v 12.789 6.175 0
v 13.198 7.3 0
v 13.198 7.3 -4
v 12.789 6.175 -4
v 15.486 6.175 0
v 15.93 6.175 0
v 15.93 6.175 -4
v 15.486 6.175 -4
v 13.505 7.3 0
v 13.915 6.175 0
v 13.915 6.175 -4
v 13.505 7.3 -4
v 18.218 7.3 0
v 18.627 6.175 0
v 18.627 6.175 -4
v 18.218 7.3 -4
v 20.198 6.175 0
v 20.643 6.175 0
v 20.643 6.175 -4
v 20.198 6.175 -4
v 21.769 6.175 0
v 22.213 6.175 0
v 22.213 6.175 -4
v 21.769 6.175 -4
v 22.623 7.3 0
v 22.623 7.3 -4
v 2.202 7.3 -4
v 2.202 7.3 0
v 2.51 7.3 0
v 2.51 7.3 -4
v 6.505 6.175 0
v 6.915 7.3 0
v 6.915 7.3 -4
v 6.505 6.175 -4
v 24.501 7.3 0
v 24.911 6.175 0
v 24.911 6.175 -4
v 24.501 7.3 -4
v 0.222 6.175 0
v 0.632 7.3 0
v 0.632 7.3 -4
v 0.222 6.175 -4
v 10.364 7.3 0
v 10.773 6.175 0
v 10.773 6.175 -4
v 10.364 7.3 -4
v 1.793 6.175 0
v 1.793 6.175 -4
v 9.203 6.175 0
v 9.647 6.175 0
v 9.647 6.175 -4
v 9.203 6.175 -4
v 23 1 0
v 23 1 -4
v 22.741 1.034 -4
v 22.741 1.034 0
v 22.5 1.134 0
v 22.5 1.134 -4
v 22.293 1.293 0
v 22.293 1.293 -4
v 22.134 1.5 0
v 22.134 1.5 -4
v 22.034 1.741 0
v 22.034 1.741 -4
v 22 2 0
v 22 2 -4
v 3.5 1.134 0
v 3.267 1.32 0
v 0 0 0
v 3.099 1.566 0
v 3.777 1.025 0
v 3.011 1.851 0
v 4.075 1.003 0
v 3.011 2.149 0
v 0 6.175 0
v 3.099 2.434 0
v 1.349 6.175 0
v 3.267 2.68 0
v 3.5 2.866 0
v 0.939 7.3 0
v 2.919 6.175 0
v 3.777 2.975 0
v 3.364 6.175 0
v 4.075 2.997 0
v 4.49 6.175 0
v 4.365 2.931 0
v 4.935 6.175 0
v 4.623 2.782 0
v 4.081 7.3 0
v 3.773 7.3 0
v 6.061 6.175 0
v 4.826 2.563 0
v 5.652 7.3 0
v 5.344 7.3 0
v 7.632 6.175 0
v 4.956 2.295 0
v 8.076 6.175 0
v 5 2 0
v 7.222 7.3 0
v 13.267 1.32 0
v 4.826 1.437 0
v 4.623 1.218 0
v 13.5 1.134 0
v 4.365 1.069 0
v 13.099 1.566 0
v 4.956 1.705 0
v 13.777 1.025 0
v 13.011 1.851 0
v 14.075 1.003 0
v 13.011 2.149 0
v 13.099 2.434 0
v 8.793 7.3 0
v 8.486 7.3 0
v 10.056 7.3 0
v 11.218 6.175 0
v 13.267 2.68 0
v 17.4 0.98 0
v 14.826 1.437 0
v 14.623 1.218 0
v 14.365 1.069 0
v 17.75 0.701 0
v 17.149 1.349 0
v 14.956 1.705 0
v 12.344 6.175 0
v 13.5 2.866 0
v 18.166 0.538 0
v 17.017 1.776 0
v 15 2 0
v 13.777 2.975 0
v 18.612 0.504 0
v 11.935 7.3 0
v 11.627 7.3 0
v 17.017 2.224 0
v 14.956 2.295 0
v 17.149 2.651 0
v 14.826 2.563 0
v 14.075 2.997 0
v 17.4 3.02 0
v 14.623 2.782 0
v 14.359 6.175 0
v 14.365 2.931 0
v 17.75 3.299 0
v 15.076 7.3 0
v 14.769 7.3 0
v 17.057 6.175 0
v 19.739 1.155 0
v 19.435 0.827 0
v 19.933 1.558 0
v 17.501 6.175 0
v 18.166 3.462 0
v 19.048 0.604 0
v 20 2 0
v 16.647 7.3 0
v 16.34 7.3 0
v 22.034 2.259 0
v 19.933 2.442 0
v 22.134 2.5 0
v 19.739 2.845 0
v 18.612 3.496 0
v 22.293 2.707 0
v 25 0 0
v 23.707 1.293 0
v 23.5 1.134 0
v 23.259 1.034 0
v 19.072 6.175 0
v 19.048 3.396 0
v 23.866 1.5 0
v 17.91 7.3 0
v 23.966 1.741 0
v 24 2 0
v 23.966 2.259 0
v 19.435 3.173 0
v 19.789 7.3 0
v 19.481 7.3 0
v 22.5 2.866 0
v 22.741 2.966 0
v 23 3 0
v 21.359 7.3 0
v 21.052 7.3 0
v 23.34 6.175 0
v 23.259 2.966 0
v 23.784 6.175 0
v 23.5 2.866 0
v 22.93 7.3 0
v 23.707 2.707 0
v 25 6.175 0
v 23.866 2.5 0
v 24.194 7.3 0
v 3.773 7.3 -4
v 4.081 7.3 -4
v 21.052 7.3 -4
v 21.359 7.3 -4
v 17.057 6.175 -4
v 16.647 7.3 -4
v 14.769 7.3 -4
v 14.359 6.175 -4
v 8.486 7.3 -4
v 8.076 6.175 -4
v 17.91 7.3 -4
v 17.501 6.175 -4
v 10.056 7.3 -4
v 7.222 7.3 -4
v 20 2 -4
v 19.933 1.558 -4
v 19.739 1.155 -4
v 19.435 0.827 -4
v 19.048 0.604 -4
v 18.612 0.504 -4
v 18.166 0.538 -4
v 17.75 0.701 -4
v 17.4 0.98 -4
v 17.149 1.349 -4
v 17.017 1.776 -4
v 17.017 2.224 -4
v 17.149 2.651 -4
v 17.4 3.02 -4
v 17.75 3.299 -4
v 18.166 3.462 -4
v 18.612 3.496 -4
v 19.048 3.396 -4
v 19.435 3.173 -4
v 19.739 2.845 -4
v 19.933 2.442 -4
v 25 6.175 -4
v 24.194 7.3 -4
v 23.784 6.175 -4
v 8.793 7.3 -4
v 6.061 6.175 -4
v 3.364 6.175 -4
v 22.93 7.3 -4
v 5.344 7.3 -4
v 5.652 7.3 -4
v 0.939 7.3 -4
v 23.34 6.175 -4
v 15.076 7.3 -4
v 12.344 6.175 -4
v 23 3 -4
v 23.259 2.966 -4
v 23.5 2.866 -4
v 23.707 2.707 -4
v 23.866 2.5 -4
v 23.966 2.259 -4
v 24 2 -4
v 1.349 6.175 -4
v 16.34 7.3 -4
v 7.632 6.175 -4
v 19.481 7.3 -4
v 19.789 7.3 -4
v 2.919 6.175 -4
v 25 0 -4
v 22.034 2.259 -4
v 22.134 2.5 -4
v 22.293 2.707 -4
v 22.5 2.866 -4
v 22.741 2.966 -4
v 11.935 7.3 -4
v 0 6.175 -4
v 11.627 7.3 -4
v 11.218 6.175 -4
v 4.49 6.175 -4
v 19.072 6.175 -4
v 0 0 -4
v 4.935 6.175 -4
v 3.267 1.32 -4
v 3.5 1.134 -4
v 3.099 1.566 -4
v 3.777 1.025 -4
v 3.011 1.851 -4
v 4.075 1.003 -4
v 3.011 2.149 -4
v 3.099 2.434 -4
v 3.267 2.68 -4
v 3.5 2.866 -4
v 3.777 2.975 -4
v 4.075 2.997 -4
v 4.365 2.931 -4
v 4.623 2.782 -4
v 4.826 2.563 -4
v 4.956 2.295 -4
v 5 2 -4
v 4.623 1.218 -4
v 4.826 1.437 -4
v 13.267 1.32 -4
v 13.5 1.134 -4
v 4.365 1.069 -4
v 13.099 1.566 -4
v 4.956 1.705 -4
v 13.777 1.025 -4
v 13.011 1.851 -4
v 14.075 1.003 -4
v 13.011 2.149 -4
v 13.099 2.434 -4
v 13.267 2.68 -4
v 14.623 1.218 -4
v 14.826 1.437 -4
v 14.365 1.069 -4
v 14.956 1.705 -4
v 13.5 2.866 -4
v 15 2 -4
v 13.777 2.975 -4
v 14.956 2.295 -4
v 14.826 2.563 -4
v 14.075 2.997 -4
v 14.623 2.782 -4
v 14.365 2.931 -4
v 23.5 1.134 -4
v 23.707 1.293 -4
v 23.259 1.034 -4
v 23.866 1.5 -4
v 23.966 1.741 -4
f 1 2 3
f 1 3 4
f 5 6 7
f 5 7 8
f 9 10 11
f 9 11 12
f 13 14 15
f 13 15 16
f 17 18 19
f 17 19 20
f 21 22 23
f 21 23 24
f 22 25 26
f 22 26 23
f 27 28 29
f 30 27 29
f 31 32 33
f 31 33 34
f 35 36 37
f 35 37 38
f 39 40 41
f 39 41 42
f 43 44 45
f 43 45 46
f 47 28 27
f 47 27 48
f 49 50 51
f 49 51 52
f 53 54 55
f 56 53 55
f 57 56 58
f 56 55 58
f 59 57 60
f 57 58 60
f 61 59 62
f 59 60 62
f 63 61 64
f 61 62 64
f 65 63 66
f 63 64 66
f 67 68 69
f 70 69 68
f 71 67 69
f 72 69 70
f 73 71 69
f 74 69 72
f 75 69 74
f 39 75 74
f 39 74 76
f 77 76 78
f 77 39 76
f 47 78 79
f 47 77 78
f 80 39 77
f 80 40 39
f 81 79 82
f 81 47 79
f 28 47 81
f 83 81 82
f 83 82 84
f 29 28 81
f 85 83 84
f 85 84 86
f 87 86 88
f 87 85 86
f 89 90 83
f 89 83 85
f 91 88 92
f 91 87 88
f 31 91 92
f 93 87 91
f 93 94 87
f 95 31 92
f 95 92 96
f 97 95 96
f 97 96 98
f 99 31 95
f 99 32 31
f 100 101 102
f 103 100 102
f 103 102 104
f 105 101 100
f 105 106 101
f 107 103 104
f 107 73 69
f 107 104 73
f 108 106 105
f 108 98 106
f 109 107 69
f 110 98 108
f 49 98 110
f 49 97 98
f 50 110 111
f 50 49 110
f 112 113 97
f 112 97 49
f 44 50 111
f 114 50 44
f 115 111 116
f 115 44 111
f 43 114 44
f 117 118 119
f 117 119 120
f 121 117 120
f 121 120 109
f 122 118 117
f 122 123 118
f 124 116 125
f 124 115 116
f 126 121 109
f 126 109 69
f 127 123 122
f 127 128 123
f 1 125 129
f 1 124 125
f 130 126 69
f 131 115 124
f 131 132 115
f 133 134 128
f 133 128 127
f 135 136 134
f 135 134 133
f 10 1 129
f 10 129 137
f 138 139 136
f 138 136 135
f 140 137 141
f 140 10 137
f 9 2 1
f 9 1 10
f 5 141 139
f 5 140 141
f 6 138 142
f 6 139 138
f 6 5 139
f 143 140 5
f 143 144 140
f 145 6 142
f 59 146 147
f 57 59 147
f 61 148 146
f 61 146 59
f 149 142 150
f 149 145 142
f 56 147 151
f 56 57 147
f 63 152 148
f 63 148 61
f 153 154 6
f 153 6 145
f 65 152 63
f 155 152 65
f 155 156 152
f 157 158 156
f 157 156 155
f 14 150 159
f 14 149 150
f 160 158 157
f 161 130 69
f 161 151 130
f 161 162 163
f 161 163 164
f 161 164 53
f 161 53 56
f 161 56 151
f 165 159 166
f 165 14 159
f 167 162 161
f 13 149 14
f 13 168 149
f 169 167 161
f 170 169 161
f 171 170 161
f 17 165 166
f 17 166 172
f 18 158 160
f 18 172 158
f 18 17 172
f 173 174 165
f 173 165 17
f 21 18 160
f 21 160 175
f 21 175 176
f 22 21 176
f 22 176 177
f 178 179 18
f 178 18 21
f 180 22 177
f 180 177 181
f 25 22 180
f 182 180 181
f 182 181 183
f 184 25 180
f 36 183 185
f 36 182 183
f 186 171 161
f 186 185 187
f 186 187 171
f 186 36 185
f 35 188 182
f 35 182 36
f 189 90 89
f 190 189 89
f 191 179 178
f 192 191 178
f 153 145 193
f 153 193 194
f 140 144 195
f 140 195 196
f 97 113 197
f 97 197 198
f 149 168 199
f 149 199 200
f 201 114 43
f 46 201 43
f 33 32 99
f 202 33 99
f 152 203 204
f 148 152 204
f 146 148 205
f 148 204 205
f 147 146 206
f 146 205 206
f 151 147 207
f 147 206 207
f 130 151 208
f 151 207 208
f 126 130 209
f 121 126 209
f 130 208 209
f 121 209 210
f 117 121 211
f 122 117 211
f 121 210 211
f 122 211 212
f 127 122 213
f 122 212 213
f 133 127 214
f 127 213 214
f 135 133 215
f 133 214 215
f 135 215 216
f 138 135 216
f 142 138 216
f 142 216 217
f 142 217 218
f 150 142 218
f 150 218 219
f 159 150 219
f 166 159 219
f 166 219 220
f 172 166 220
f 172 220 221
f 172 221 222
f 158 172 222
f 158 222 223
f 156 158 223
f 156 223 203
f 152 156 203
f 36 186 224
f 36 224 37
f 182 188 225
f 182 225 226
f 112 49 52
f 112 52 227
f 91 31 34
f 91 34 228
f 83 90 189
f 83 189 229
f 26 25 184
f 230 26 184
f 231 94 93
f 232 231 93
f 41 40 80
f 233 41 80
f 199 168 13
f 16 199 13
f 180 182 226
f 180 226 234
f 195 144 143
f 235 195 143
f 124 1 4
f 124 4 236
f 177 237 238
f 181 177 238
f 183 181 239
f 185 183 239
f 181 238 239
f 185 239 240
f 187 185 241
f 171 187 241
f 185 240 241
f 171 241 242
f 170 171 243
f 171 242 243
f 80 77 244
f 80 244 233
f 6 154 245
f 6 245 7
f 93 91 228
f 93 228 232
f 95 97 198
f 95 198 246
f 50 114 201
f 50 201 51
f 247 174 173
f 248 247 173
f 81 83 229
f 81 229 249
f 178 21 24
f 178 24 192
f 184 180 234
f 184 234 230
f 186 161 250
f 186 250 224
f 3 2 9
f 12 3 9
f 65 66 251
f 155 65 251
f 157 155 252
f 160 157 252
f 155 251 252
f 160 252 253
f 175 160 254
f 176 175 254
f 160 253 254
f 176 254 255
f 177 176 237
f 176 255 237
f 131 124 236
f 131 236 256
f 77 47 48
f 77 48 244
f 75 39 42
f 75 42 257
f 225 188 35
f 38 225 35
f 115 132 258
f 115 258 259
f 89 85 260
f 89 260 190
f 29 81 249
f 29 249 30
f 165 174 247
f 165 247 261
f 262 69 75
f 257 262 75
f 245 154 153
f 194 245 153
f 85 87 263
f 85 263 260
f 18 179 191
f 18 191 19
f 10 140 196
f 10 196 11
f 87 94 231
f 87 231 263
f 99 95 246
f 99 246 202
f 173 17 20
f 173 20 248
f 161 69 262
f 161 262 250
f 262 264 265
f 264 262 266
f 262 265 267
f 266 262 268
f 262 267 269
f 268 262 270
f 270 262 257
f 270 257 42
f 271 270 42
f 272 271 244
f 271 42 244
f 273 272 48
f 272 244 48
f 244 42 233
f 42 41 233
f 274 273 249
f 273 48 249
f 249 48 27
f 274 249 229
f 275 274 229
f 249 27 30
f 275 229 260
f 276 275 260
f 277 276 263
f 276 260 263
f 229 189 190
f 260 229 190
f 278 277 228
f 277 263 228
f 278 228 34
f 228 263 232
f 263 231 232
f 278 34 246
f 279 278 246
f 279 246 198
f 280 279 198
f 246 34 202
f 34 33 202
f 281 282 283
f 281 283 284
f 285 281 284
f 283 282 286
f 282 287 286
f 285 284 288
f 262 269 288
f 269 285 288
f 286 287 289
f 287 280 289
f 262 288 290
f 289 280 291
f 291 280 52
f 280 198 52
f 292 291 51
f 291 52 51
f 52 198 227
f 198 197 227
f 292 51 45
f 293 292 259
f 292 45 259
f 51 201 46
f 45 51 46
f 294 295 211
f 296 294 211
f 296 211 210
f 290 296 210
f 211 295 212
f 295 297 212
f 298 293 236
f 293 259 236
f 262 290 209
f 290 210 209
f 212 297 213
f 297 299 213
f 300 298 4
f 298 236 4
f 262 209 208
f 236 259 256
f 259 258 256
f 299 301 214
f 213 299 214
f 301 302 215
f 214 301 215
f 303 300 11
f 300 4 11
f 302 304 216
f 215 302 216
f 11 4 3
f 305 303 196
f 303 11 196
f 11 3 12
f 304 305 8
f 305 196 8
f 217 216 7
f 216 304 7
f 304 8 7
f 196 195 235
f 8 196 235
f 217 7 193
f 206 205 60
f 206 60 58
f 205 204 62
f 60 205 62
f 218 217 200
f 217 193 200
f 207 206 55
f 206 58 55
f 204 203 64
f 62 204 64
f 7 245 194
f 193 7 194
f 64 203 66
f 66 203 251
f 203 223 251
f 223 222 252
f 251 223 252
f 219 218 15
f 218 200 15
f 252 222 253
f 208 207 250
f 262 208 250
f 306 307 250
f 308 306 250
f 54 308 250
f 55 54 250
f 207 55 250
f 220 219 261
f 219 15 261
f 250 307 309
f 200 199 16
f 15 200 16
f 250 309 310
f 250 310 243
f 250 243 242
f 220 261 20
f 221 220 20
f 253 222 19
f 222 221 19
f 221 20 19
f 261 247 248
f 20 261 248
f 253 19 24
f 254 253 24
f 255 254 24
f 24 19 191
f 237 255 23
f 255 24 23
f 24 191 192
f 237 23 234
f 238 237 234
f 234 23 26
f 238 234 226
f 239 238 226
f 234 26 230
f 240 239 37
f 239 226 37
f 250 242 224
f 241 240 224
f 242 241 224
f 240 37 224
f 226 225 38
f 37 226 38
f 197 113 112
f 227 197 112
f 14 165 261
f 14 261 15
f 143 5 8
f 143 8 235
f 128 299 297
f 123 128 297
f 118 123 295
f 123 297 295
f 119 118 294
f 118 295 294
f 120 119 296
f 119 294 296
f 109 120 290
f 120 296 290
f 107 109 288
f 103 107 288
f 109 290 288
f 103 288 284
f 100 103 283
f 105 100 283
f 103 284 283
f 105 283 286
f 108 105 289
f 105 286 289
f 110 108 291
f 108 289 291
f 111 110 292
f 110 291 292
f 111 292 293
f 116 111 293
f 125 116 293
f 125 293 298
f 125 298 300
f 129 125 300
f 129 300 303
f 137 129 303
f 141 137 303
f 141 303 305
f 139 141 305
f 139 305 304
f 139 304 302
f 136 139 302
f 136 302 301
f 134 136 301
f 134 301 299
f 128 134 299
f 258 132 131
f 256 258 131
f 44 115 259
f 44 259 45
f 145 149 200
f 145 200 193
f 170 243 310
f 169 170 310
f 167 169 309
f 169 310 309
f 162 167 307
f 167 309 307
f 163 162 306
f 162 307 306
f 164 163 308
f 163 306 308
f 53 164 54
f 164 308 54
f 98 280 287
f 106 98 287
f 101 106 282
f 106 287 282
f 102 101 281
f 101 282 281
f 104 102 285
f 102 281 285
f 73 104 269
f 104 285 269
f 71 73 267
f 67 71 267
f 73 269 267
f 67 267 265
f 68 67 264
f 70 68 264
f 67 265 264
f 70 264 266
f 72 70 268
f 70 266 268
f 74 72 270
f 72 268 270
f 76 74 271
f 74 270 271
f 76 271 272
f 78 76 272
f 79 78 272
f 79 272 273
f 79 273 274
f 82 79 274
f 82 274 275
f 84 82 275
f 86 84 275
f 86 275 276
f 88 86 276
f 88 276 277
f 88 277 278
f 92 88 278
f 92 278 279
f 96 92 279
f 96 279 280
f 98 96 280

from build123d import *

# Parameters (mm, degrees)
BLANKSKE_W         = 25
BLANKSKE_H         = 7.3
BLANK_DEPTH        = 4
TOOTHCUTSIM_DEPTH  = 27.349383294
TEETHCUTS_COUNT    = 17
TEETHCUTS_PITCH    = 1.570796325
CUT_EXTRUDE1_DEPTH = 27.349383294


with BuildPart() as part:
    # BlankSke → Blank (new body)
    with BuildSketch(Plane.XY):
        with Locations((12.5, 3.65)):
            Rectangle(BLANKSKE_W, BLANKSKE_H)
    extrude(amount=-BLANK_DEPTH)

    # TooCutSkeSim → ToothCutSim (cut, through all)
    with BuildSketch(Plane.XY):
        Polygon((0.222217685, 6.175), (-0.222217685, 6.175), (-0.640929042, 7.3254), (0.640929042, 7.3254), align=None)
    toothcutsim = extrude(amount=-TOOTHCUTSIM_DEPTH, mode=Mode.SUBTRACT)

    # TeethCuts: ToothCutSim ×17
    with Locations(*[(i * TEETHCUTS_PITCH, 0, 0) for i in range(1, TEETHCUTS_COUNT)]):
        add(toothcutsim, mode=Mode.SUBTRACT)

    # Sketch1 → Cut-Extrude1 (cut, through all)
    with BuildSketch(Plane(origin=(0, 0, -4), x_dir=(-1, 0, 0), z_dir=(0, 0, -1))):
        with BuildLine():
            Line((-23, 1), (-23, 2))
            Line((-23, 2), (-24, 2))
            ThreePointArc((-24, 2), (-23.707106781, 1.292893219), (-23, 1))
        make_face()
        with BuildLine():
            Line((-24, 2), (-23, 2))
            Line((-23, 2), (-23, 3))
            ThreePointArc((-23, 3), (-23.707106781, 2.707106781), (-24, 2))
        make_face()
        with BuildLine():
            Line((-23, 3), (-23, 2))
            Line((-23, 2), (-23, 1))
            ThreePointArc((-23, 1), (-22.292893219, 1.292893219), (-22, 2))
            ThreePointArc((-22, 2), (-22.292893219, 2.707106781), (-23, 3))
        make_face()
        with BuildLine():
            ThreePointArc((-17, 2), (-18.5, 3.5), (-20, 2))
            Line((-20, 2), (-17, 2))
        make_face()
        with BuildLine():
            Line((-17, 2), (-20, 2))
            ThreePointArc((-20, 2), (-18.5, 0.5), (-17, 2))
        make_face()
        with BuildLine():
            ThreePointArc((-13, 2), (-14, 3), (-15, 2))
            Line((-15, 2), (-13, 2))
        make_face()
        with BuildLine():
            Line((-13, 2), (-15, 2))
            ThreePointArc((-15, 2), (-14, 1), (-13, 2))
        make_face()
        with BuildLine():
            ThreePointArc((-3, 2), (-4, 3), (-5, 2))
            Line((-5, 2), (-3, 2))
        make_face()
        with BuildLine():
            Line((-3, 2), (-5, 2))
            ThreePointArc((-5, 2), (-4, 1), (-3, 2))
        make_face()
    extrude(amount=-CUT_EXTRUDE1_DEPTH, mode=Mode.SUBTRACT)


solid = part.part
